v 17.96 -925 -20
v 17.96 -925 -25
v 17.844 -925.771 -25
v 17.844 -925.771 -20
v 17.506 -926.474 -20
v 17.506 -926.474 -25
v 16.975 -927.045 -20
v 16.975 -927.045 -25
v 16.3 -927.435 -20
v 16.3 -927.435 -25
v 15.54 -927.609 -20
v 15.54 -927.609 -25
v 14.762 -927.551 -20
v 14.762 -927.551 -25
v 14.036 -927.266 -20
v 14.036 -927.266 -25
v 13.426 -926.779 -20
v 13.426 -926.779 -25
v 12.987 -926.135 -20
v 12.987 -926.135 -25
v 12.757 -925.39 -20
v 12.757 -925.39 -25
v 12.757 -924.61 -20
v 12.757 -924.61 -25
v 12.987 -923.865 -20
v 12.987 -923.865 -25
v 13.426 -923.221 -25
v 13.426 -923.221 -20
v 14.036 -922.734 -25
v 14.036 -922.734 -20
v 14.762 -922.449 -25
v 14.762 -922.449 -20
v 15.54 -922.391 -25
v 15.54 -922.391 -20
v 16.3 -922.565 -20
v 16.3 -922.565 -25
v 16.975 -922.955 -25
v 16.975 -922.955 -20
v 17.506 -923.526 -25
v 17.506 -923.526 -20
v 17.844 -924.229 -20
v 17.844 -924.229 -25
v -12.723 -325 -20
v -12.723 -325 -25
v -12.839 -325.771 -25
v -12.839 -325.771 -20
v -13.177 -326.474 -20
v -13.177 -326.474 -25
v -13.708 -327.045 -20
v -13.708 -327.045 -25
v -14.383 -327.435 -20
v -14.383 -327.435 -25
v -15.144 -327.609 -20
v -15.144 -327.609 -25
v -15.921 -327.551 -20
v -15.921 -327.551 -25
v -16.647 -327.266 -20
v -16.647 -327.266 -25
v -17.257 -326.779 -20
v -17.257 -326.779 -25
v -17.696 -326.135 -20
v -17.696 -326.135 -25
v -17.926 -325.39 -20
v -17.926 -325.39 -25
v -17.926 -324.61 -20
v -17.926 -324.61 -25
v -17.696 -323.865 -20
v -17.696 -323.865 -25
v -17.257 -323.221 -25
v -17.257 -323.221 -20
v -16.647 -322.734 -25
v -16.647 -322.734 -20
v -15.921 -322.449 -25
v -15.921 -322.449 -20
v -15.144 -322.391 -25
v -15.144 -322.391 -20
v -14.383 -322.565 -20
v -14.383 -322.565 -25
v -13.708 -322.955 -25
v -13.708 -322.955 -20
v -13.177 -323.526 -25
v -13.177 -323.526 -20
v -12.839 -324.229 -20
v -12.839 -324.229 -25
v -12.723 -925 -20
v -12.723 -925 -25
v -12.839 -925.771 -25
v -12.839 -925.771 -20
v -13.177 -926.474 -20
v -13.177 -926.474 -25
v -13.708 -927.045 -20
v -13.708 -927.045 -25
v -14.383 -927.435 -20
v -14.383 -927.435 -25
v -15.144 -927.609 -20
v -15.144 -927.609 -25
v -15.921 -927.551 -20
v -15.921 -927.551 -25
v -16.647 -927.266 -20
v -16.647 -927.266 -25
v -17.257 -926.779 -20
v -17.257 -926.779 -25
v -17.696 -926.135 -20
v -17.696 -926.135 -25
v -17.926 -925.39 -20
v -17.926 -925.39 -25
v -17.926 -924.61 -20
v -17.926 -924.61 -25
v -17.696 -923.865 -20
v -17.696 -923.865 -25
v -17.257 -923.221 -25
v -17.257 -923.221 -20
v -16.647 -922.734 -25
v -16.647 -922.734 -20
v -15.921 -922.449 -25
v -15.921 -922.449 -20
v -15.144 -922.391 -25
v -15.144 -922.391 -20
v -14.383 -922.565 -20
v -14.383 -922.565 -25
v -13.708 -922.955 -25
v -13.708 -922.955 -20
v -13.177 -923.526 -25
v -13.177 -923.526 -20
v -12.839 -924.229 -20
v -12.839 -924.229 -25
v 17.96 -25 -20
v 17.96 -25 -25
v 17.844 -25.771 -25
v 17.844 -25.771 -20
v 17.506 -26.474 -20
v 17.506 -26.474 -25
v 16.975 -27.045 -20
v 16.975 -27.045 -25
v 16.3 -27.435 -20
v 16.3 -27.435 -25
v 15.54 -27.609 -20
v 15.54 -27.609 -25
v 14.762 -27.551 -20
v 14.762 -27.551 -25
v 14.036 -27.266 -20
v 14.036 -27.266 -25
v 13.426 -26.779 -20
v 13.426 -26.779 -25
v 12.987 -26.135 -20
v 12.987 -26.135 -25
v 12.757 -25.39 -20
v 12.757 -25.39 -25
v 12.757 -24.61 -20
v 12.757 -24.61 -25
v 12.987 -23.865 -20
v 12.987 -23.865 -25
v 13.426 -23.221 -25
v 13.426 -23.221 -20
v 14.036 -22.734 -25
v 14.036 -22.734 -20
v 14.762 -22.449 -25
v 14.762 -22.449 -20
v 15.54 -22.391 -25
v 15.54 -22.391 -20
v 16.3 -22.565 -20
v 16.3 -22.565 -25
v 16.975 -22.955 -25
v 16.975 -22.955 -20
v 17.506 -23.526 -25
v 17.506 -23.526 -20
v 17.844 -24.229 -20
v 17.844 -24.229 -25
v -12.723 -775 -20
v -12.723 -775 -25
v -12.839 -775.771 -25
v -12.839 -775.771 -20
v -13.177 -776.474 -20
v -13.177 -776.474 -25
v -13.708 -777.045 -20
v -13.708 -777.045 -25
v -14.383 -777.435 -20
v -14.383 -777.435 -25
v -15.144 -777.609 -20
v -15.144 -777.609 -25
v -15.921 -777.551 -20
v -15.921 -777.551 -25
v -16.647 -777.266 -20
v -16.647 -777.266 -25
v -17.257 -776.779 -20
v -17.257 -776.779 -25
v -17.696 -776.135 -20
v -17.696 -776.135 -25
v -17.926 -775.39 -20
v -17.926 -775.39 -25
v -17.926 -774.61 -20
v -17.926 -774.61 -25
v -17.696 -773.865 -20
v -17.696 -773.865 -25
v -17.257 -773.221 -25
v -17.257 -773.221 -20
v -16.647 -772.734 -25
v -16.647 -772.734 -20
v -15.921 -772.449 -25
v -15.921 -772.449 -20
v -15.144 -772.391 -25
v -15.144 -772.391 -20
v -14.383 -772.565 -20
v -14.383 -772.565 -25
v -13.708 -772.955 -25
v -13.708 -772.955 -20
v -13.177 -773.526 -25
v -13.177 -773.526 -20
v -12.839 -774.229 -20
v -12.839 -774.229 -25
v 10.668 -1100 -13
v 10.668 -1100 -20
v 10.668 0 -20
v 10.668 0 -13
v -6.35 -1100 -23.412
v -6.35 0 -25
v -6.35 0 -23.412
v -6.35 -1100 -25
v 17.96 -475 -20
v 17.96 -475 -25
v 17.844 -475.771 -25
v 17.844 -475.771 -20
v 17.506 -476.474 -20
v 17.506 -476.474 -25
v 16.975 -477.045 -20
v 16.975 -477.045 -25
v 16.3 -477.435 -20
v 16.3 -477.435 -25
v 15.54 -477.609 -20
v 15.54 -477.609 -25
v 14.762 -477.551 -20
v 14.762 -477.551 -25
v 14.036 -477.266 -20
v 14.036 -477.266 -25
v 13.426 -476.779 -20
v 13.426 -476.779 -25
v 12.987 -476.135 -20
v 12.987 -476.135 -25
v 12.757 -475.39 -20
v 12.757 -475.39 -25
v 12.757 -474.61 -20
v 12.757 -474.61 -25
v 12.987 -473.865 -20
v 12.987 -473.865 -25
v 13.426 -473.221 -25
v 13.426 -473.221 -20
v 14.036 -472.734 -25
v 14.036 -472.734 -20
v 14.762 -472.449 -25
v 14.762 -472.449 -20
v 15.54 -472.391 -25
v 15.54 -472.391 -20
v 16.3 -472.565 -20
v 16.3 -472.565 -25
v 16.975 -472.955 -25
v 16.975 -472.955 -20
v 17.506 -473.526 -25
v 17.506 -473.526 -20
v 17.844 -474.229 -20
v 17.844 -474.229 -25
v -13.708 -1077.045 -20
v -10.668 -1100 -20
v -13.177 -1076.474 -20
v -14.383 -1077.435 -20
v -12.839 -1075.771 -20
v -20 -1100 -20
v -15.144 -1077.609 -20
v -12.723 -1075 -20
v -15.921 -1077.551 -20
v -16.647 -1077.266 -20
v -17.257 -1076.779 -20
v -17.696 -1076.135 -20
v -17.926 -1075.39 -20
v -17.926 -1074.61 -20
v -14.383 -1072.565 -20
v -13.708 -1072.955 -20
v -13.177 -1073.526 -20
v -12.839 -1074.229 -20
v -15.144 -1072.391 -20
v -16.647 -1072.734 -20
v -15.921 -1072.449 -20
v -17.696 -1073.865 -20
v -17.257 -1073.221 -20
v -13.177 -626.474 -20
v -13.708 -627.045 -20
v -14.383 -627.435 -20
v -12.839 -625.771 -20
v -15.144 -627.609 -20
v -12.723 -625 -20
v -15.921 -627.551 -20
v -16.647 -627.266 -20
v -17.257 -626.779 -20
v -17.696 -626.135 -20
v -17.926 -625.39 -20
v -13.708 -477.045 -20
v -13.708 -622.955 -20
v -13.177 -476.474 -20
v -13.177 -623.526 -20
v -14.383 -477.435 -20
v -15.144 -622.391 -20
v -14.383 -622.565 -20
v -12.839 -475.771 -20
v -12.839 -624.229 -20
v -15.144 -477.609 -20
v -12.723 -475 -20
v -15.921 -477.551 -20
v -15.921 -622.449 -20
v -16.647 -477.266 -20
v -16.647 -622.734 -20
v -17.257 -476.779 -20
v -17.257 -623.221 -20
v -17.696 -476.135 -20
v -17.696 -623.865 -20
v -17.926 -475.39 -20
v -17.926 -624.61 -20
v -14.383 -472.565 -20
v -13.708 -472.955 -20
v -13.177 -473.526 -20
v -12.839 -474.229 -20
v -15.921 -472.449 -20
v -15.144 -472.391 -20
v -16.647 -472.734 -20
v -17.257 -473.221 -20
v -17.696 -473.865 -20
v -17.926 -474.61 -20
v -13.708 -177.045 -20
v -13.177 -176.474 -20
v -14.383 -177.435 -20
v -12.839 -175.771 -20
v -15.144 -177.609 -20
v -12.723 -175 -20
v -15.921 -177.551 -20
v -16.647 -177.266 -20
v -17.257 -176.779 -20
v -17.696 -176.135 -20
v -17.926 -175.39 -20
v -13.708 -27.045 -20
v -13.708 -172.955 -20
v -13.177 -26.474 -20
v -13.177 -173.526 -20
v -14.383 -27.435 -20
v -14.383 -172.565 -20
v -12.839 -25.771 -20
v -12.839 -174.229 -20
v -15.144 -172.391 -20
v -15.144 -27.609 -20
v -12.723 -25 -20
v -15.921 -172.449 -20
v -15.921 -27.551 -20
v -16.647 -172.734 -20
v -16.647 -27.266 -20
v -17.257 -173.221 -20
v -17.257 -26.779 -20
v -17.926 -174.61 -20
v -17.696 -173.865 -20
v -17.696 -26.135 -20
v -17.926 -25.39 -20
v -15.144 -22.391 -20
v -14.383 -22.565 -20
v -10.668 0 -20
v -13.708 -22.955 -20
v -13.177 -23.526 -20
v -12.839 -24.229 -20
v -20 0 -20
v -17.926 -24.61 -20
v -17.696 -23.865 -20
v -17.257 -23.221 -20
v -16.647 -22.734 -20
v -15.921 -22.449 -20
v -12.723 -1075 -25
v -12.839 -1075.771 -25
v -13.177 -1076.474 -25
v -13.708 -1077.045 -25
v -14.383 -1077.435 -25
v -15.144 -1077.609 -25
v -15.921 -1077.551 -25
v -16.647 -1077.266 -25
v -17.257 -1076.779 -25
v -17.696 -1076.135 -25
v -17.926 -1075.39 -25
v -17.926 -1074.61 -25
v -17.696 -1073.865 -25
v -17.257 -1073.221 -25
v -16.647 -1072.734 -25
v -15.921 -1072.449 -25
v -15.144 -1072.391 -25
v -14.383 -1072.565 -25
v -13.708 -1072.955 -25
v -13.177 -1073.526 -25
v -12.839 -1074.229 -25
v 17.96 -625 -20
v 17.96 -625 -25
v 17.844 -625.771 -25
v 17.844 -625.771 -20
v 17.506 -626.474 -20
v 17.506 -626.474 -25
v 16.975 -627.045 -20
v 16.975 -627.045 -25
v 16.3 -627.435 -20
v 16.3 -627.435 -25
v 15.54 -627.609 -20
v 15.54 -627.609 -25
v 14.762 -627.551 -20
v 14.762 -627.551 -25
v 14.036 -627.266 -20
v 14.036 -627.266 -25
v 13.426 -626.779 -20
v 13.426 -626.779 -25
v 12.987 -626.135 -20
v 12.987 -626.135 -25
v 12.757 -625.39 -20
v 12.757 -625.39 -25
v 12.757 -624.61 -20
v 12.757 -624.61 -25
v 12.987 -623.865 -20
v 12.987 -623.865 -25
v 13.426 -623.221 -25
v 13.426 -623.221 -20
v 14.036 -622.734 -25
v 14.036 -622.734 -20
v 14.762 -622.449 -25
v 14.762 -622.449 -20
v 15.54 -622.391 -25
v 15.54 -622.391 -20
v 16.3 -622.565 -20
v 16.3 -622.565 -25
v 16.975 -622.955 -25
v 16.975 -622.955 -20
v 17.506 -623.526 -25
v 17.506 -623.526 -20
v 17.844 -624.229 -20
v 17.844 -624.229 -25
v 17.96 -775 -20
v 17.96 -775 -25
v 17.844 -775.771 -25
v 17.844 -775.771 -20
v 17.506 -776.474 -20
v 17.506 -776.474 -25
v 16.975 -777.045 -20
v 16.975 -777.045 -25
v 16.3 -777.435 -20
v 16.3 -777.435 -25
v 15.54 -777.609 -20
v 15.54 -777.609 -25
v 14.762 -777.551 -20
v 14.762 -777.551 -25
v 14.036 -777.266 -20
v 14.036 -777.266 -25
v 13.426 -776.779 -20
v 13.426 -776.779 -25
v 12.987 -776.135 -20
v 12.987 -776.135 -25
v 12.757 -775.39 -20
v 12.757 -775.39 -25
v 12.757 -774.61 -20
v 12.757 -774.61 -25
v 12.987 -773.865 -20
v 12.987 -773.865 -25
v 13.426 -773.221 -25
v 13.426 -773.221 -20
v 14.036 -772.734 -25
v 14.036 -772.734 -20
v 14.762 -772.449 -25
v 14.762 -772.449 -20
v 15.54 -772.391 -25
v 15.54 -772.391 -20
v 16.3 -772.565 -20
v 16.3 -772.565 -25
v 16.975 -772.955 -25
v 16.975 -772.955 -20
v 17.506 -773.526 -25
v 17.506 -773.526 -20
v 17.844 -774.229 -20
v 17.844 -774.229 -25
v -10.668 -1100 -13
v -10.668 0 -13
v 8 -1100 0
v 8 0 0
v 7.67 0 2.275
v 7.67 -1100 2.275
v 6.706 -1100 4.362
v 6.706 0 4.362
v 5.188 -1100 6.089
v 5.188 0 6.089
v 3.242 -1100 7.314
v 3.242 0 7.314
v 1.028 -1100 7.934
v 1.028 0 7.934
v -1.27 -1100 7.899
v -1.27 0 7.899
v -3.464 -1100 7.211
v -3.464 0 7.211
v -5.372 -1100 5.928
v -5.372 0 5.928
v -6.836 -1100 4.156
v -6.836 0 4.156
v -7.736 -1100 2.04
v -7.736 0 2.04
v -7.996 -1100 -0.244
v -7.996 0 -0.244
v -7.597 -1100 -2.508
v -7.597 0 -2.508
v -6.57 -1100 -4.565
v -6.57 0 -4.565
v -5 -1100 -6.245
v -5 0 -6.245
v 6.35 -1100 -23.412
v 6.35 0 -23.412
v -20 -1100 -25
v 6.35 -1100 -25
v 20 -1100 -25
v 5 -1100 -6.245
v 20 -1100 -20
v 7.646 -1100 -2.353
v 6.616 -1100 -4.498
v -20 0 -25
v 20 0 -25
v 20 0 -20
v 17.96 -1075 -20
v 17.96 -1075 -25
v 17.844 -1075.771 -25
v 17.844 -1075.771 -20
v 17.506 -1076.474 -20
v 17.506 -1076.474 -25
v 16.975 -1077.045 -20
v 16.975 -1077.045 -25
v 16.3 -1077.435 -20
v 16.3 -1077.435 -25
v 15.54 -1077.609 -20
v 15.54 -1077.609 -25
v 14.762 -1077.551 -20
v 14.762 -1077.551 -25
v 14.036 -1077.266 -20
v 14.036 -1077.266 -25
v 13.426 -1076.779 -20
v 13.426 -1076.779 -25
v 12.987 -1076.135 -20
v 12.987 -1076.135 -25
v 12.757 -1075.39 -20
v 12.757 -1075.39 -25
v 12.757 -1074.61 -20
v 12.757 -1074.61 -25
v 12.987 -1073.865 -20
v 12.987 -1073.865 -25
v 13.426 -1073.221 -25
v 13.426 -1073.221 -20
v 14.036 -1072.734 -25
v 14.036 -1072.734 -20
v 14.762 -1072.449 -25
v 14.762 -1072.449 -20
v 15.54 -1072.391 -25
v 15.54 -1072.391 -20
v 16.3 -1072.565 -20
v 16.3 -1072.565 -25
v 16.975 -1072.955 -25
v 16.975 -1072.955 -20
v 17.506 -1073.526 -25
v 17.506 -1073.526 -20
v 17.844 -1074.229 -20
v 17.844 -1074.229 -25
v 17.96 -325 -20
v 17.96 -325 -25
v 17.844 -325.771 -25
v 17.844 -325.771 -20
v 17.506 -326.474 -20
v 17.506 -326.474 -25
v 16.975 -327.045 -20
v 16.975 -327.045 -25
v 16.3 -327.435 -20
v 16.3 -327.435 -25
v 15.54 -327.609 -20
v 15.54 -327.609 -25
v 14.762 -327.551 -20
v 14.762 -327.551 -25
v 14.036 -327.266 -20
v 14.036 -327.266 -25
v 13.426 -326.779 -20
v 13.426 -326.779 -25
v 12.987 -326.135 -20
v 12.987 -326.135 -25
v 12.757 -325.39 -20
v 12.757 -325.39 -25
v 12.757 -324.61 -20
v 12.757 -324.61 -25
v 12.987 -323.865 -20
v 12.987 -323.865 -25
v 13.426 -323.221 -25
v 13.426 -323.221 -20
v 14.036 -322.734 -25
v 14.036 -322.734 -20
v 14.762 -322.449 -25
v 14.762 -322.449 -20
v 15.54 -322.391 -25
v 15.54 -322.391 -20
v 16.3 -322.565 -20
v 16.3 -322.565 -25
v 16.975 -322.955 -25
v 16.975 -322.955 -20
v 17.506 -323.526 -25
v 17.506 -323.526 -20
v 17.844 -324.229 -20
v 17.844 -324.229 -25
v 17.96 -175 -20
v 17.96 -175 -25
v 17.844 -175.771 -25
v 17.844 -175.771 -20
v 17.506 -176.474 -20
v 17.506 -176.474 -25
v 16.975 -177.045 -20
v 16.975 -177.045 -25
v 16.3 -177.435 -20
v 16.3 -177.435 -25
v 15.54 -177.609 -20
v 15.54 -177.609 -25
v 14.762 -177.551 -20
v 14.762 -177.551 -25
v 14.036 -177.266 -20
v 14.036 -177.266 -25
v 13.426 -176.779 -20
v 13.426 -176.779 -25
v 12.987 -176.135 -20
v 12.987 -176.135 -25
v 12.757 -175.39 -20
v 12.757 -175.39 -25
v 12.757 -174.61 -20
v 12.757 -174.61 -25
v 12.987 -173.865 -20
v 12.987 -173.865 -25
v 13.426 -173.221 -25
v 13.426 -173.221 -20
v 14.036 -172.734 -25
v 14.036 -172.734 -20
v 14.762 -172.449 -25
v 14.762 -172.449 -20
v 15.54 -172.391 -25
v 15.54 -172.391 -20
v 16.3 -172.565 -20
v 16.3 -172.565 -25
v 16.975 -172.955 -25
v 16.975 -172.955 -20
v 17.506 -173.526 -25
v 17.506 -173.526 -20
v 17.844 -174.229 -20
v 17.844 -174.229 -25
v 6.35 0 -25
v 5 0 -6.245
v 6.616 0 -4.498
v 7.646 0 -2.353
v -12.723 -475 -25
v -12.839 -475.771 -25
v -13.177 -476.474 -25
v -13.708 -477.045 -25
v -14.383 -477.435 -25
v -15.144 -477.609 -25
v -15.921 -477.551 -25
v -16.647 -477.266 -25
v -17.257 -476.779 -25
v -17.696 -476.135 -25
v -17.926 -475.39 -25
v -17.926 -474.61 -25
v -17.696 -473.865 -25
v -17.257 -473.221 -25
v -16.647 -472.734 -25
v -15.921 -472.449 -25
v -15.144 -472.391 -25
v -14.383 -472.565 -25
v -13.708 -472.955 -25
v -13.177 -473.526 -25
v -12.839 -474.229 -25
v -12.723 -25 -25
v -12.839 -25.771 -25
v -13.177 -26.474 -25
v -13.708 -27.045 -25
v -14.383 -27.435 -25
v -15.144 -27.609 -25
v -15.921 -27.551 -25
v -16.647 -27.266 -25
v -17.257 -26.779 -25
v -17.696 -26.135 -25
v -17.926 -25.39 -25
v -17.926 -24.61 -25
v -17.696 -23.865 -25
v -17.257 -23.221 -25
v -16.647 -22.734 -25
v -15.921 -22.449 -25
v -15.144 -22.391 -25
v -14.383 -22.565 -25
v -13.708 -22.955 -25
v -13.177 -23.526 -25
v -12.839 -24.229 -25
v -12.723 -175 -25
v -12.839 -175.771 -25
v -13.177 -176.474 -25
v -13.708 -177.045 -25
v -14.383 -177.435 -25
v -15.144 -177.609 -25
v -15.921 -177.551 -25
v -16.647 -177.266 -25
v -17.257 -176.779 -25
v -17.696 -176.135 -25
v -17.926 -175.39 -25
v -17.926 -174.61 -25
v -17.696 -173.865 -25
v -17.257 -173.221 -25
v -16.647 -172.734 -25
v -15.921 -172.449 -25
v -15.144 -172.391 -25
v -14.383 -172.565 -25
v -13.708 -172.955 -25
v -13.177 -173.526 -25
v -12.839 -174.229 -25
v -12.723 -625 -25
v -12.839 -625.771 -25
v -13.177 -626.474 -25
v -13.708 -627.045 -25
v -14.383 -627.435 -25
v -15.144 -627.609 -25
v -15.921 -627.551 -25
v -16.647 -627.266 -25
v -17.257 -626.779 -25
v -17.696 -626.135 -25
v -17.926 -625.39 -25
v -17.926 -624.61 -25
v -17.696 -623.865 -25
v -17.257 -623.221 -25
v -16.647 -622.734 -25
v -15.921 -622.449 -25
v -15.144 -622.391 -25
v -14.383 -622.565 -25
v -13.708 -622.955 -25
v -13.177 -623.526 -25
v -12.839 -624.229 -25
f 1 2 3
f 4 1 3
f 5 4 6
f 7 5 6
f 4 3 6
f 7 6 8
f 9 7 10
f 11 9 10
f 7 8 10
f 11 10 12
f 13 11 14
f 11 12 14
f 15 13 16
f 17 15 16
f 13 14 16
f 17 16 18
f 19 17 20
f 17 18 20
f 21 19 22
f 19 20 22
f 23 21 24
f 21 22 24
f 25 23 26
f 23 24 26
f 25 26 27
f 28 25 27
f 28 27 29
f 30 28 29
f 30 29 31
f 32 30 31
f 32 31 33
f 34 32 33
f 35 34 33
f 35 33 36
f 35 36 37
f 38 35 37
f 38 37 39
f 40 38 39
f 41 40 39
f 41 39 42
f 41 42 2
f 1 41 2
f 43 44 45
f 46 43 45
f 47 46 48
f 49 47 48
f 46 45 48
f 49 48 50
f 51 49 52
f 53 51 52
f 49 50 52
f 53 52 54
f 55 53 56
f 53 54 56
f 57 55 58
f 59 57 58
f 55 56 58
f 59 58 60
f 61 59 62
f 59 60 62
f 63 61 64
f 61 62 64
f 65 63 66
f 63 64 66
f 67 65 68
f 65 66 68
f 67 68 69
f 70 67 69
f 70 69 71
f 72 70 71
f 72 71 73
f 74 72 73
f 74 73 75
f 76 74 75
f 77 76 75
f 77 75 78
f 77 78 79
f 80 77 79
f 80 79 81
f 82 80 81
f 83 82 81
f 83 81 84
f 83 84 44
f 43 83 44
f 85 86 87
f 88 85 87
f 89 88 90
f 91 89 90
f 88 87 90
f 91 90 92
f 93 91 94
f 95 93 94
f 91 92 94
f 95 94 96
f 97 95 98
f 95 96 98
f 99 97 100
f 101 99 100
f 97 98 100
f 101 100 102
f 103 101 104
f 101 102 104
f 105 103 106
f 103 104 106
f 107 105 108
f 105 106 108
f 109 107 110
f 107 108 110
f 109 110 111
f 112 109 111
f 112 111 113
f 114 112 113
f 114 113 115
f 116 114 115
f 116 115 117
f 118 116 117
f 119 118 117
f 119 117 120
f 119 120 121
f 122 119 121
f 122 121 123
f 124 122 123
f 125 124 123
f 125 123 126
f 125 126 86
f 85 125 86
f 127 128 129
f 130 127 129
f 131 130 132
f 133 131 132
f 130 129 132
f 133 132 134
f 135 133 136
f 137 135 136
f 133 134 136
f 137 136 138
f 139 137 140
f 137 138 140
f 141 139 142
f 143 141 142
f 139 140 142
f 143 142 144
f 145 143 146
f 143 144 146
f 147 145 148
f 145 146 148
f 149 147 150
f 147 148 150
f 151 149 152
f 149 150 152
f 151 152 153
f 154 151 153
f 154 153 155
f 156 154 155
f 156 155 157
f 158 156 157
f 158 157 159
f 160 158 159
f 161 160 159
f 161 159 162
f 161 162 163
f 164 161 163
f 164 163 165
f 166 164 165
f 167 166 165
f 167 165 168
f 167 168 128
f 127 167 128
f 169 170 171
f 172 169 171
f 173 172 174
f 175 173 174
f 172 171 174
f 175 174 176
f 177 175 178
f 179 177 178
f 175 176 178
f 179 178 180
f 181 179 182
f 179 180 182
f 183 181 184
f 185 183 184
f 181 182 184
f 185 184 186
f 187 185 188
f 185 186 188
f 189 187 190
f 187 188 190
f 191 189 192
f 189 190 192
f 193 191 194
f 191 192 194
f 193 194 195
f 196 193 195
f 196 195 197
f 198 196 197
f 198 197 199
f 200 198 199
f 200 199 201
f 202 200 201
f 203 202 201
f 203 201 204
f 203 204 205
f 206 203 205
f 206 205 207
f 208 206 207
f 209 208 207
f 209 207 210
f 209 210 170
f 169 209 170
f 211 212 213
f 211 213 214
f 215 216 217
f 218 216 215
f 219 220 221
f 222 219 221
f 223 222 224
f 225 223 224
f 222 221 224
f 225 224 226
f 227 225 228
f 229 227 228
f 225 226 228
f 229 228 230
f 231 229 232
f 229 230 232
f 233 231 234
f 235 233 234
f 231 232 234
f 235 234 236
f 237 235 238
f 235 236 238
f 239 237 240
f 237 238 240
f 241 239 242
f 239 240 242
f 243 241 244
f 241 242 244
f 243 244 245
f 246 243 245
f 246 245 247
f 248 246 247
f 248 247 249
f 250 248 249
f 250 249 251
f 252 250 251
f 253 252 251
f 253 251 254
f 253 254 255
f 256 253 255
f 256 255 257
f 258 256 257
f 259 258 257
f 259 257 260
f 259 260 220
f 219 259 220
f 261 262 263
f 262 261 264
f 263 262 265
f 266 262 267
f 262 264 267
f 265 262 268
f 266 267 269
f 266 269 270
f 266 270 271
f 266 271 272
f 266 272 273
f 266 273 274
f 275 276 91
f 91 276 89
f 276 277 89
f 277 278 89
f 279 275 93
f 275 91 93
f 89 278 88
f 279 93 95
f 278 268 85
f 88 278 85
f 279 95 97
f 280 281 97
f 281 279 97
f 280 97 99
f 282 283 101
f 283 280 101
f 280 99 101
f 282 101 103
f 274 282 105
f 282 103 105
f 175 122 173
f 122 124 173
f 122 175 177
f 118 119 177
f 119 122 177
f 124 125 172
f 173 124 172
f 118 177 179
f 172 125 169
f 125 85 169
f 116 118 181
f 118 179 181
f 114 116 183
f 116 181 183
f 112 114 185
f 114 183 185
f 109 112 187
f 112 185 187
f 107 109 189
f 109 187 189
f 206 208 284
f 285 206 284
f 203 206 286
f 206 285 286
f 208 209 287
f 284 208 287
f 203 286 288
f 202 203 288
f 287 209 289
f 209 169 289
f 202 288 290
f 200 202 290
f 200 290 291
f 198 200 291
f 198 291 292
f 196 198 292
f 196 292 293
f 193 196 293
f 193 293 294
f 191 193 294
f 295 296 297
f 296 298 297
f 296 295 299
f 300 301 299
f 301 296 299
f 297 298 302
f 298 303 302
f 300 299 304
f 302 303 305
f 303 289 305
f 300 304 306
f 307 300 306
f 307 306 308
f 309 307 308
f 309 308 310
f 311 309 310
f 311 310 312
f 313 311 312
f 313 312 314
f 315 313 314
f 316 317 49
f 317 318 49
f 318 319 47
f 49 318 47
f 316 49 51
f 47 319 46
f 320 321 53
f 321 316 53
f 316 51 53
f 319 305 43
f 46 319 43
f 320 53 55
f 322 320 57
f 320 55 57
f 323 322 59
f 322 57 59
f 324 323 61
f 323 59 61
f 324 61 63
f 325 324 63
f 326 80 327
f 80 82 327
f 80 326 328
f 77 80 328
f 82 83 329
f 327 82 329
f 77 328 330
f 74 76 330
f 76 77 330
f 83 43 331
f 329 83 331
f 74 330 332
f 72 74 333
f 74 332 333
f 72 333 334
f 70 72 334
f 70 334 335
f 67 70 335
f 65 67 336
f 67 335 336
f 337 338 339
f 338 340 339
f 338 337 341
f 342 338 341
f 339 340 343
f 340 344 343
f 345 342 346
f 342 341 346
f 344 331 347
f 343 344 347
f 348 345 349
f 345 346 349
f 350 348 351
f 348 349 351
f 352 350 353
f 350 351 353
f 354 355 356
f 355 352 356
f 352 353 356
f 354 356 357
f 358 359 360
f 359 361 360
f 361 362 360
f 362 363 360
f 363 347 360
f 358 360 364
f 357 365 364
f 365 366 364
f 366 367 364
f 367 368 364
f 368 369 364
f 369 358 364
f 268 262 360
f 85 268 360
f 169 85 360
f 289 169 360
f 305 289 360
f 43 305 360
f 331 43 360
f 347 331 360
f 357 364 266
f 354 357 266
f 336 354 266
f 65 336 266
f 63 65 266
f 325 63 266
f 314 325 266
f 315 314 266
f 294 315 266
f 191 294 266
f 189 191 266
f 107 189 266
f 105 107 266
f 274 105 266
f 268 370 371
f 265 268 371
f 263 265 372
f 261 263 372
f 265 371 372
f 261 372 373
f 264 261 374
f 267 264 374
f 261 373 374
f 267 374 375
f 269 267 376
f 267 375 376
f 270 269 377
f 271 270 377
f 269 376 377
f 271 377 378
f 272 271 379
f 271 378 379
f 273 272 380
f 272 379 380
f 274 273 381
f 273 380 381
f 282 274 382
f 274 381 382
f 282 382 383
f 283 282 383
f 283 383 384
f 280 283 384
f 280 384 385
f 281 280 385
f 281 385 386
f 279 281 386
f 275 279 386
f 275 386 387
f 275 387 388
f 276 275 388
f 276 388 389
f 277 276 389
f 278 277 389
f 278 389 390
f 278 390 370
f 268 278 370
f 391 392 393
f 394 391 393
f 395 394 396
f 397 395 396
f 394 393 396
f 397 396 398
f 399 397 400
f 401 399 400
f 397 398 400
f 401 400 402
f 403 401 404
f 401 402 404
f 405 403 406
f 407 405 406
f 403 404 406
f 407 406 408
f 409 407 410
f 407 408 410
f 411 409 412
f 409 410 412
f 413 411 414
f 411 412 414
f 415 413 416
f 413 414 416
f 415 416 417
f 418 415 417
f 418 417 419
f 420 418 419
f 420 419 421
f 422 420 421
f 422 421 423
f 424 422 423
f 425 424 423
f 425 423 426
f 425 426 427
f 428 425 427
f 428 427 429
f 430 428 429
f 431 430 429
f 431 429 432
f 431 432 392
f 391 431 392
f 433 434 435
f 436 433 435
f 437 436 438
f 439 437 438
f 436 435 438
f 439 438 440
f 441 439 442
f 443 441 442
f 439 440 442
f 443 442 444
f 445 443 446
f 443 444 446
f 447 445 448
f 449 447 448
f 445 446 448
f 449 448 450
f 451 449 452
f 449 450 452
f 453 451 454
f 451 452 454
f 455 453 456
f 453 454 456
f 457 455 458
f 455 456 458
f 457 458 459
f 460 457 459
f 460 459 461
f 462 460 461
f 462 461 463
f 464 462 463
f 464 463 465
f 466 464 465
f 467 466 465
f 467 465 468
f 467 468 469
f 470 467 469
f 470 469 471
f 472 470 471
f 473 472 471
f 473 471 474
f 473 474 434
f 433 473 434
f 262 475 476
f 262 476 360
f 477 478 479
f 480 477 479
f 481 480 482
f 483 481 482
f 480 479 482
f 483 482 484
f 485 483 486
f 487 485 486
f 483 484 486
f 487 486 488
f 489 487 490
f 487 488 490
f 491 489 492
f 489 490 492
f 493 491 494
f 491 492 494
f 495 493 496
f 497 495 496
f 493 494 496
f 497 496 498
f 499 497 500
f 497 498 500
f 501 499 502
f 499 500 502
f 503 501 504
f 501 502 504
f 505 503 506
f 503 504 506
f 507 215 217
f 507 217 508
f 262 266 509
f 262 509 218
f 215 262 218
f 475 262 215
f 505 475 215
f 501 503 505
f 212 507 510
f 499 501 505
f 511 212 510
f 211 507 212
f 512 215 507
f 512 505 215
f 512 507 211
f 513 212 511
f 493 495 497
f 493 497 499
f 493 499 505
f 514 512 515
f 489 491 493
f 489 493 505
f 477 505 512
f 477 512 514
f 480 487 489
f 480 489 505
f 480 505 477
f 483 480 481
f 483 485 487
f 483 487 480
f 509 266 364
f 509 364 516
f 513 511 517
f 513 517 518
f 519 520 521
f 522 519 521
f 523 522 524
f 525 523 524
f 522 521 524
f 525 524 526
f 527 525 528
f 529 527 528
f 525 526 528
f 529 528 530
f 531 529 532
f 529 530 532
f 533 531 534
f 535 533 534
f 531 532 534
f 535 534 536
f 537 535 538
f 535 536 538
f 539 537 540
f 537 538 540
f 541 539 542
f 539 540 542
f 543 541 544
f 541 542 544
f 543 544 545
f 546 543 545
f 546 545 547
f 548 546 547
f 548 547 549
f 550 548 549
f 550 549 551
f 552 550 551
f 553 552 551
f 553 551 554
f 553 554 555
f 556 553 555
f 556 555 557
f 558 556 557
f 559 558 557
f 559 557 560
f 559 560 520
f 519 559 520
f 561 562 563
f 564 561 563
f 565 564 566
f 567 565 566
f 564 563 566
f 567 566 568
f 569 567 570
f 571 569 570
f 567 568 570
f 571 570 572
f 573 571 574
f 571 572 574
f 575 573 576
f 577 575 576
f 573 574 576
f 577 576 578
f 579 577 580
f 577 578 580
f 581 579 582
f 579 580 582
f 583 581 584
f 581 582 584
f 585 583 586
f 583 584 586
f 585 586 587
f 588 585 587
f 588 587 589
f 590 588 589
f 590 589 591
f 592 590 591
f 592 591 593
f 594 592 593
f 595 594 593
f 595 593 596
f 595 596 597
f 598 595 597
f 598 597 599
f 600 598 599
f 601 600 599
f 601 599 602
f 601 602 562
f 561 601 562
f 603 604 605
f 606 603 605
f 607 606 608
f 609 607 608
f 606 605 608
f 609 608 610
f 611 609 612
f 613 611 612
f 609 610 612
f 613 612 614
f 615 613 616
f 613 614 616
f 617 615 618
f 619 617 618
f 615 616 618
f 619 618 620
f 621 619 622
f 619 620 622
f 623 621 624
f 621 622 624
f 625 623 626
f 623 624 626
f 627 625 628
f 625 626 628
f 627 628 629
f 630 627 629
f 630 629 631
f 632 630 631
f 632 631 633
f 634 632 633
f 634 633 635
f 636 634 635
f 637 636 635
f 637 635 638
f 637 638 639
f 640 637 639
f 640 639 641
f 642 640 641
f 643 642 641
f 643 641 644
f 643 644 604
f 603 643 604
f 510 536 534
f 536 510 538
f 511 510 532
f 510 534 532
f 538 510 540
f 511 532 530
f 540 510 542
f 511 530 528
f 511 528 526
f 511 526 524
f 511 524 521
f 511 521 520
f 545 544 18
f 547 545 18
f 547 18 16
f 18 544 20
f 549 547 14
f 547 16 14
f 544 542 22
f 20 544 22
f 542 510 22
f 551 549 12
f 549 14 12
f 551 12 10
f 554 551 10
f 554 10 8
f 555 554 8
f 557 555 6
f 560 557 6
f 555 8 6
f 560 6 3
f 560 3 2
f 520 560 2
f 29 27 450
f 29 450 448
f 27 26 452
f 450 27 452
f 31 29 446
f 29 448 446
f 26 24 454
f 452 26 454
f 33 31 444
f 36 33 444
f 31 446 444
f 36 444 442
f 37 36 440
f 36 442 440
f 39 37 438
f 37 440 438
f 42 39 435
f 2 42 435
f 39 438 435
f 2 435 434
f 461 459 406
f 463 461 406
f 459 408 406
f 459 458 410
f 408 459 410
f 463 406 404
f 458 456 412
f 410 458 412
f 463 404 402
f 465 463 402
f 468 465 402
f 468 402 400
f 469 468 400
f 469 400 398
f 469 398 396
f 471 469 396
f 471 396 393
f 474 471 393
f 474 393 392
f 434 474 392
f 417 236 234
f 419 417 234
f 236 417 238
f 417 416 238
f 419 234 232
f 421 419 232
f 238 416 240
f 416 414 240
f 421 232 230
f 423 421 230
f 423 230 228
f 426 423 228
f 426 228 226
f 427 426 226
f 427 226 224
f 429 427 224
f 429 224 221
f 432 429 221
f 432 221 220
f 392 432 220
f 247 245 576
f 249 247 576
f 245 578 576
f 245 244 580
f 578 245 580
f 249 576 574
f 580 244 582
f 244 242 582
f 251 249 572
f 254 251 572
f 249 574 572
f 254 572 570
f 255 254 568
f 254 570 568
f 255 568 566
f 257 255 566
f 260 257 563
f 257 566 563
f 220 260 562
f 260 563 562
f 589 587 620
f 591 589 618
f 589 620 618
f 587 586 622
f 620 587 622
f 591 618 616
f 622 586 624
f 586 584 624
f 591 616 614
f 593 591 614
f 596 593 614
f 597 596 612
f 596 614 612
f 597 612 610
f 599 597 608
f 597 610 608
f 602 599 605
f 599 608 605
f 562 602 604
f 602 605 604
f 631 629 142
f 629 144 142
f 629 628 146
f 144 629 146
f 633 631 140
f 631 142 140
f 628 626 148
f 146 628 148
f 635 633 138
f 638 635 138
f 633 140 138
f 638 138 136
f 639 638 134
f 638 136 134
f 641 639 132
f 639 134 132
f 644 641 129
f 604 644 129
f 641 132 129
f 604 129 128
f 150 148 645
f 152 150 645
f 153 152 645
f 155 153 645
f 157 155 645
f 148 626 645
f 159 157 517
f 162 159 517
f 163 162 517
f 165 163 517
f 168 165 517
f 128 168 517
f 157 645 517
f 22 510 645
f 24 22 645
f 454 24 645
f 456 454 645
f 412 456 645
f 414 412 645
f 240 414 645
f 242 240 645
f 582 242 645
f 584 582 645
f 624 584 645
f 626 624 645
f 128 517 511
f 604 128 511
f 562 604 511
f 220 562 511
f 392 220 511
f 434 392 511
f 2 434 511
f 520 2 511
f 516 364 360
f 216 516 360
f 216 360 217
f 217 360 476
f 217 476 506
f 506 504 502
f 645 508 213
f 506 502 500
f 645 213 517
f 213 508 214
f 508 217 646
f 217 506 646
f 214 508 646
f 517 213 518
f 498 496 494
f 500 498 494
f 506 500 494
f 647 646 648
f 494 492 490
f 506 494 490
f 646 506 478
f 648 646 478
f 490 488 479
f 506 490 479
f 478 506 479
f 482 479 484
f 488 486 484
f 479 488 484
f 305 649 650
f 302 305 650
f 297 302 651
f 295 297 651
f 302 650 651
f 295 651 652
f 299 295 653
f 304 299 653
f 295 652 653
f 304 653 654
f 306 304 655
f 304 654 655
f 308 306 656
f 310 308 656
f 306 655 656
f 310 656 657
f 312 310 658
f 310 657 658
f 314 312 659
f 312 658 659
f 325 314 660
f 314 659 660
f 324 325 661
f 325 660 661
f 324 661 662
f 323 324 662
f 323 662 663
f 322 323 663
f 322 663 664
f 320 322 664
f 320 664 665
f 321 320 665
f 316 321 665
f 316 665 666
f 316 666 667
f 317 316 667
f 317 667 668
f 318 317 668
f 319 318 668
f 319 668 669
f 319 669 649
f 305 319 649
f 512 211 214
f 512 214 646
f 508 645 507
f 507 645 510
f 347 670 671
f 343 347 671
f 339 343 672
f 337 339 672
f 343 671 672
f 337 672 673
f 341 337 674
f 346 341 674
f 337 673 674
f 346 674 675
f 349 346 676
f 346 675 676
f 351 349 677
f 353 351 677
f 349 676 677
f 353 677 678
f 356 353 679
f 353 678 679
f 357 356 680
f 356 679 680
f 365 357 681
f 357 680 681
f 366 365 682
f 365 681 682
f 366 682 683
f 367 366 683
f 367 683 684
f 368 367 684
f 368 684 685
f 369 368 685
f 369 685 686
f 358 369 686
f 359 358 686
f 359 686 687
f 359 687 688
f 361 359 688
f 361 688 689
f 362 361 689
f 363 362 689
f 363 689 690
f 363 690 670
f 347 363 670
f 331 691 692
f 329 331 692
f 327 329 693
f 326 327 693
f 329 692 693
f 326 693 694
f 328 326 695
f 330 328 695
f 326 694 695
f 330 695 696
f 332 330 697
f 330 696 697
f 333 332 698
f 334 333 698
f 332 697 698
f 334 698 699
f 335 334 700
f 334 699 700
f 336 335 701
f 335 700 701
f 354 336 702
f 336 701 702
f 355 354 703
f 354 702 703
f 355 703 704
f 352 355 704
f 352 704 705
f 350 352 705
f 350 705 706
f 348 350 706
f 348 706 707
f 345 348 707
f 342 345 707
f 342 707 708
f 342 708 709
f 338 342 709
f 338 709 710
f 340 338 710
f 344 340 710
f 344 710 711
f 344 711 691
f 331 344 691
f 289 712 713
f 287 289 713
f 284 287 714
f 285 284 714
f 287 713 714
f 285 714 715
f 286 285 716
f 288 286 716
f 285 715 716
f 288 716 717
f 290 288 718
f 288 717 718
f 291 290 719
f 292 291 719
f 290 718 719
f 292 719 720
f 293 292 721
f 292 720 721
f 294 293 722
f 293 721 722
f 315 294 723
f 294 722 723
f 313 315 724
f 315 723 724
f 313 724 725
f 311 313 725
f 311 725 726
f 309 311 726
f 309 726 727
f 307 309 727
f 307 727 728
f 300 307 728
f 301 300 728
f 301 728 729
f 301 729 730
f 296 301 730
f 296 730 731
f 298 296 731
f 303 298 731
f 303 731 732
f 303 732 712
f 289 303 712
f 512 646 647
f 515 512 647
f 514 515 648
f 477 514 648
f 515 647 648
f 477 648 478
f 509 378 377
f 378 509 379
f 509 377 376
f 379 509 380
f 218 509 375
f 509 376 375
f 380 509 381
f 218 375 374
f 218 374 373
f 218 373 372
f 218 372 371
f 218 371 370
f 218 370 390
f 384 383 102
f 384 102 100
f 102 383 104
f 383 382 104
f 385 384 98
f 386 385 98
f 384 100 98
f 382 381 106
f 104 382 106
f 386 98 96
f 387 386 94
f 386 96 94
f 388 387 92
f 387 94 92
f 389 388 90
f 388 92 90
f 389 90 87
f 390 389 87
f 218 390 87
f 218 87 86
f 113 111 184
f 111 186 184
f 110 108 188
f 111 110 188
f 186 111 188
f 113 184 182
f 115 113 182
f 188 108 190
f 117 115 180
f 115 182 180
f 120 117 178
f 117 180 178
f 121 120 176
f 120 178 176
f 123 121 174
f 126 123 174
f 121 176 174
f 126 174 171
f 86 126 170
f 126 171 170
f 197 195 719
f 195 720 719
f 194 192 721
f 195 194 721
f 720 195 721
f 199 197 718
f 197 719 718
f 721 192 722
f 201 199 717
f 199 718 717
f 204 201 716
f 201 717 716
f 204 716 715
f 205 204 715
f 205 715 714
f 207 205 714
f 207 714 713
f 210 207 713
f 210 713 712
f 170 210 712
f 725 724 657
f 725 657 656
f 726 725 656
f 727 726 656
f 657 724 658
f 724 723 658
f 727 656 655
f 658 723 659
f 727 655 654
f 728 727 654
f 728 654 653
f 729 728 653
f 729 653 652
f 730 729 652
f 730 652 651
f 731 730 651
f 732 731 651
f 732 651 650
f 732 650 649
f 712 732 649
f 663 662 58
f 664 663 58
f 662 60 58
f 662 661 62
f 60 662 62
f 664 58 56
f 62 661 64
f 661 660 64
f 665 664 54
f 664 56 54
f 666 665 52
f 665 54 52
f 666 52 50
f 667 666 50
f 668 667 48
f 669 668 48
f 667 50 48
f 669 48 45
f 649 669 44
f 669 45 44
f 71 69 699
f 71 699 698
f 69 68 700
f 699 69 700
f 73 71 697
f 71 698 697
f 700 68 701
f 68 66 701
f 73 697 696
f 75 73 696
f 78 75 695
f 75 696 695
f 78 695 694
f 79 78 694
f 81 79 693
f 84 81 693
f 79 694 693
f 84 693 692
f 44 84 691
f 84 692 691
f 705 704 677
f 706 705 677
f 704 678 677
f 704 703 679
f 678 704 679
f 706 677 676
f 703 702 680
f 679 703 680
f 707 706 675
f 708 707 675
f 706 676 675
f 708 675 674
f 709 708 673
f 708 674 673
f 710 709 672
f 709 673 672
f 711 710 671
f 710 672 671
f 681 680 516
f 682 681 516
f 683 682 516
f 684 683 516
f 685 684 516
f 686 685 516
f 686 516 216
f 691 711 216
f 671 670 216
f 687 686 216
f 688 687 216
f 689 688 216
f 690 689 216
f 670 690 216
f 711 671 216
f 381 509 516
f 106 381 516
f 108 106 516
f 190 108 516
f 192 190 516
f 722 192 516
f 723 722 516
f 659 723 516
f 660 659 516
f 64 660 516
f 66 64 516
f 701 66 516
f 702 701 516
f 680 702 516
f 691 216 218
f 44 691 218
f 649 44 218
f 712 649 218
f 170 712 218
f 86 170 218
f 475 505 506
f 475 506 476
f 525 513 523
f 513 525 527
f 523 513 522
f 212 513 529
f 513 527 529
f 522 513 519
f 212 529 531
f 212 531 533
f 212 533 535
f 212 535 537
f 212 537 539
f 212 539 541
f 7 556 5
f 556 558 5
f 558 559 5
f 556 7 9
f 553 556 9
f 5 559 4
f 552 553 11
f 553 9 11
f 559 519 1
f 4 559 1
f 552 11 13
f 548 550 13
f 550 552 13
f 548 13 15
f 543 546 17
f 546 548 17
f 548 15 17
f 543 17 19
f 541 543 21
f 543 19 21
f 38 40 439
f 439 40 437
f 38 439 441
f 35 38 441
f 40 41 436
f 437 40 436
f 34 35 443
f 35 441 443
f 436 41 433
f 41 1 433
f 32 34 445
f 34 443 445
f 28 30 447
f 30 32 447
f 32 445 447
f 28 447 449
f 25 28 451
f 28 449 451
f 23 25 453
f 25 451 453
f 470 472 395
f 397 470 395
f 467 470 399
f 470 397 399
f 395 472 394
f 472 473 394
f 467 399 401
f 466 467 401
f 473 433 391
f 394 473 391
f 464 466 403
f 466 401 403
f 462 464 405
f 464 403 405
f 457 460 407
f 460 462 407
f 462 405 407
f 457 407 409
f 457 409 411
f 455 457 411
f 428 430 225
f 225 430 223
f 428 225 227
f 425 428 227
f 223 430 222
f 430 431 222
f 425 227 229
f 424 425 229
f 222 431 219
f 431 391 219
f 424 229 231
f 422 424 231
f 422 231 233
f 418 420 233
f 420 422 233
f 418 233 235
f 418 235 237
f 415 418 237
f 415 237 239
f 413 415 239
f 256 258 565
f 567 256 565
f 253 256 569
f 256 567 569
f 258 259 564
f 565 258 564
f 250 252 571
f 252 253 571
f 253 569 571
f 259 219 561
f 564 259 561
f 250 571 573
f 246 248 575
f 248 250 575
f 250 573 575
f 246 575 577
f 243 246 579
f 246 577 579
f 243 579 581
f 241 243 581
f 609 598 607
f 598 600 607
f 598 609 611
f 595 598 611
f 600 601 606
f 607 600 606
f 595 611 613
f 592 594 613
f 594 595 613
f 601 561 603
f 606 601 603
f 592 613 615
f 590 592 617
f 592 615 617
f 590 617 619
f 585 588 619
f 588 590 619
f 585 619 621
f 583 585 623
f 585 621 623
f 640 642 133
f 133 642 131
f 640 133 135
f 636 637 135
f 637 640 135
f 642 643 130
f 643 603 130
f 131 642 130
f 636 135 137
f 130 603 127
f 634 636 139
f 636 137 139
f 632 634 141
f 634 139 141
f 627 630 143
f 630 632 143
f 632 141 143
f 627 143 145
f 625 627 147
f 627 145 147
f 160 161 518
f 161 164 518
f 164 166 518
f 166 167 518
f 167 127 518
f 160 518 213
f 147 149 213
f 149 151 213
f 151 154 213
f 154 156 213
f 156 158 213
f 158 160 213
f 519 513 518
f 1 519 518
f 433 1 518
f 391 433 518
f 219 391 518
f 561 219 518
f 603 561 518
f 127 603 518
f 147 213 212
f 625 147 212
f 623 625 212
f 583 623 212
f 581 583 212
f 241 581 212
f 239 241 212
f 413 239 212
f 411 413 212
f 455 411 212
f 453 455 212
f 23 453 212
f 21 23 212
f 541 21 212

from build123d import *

# Parameters (mm, degrees)
F1_DEPTH = 1100
F2_W     = 12.7
F2_H     = 1150
F3_DEPTH = 1.5875
F4_R     = 2.6162
F5_DEPTH = 33.001


with BuildPart() as f1:
    # F0 (on Front) → F1 (new body)
    with BuildSketch(Plane.XZ):
        with BuildLine():
            ThreePointArc((5, -6.244998), (7.211103, -3.464102), (8, 0))
            ThreePointArc((8, 0), (-3.464102, 7.211103), (-5, -6.244998))
            ThreePointArc((-5, -6.244998), (0, -8), (5, -6.244998))
        make_face()
        with BuildLine():
            ThreePointArc((5, -6.244998), (0, -8), (-5, -6.244998))
            Line((-5, -6.244998), (-10.66812, -13))
            Line((-10.66812, -13), (-10.66812, -20))
            Line((-10.66812, -20), (-20, -20))
            Line((-20, -20), (-20, -25))
            Line((-20, -25), (20, -25))
            Line((20, -25), (20, -20))
            Line((20, -20), (16.541817, -20))
            Line((16.541817, -20), (10.66812, -20))
            Line((10.66812, -20), (10.66812, -13))
            Line((10.66812, -13), (5, -6.244998))
        make_face()
    extrude(amount=F1_DEPTH)

    # F2 (on face) → F3 (cut)
    with BuildSketch(Plane(origin=(0, 0, -25), x_dir=(1, 0, 0), z_dir=(0, 0, -1))):
        with Locations((0, 575)):
            Rectangle(F2_W, F2_H)
    extrude(amount=-F3_DEPTH, mode=Mode.SUBTRACT)

    # F4 (on face) → F5 (cut, through all)
    with BuildSketch(Plane(origin=(0, 0, -25), x_dir=(1, 0, 0), z_dir=(0, 0, -1))):
        with Locations((-15.3391, 1075)):
            Circle(F4_R)
        with Locations((15.3441, 1075)):
            Circle(F4_R)
        with Locations((-15.3391, 925)):
            Circle(F4_R)
        with Locations((15.3441, 925)):
            Circle(F4_R)
        with Locations((-15.3391, 775)):
            Circle(F4_R)
        with Locations((15.3441, 775)):
            Circle(F4_R)
        with Locations((-15.3391, 625)):
            Circle(F4_R)
        with Locations((15.3441, 625)):
            Circle(F4_R)
        with Locations((-15.3391, 475)):
            Circle(F4_R)
        with Locations((15.3441, 475)):
            Circle(F4_R)
        with Locations((-15.3391, 325)):
            Circle(F4_R)
        with Locations((15.3441, 325)):
            Circle(F4_R)
        with Locations((-15.3391, 175)):
            Circle(F4_R)
        with Locations((15.3441, 175)):
            Circle(F4_R)
        with Locations((-15.3391, 25)):
            Circle(F4_R)
        with Locations((15.3441, 25)):
            Circle(F4_R)
    extrude(amount=-F5_DEPTH, mode=Mode.SUBTRACT)


solid = f1.part
